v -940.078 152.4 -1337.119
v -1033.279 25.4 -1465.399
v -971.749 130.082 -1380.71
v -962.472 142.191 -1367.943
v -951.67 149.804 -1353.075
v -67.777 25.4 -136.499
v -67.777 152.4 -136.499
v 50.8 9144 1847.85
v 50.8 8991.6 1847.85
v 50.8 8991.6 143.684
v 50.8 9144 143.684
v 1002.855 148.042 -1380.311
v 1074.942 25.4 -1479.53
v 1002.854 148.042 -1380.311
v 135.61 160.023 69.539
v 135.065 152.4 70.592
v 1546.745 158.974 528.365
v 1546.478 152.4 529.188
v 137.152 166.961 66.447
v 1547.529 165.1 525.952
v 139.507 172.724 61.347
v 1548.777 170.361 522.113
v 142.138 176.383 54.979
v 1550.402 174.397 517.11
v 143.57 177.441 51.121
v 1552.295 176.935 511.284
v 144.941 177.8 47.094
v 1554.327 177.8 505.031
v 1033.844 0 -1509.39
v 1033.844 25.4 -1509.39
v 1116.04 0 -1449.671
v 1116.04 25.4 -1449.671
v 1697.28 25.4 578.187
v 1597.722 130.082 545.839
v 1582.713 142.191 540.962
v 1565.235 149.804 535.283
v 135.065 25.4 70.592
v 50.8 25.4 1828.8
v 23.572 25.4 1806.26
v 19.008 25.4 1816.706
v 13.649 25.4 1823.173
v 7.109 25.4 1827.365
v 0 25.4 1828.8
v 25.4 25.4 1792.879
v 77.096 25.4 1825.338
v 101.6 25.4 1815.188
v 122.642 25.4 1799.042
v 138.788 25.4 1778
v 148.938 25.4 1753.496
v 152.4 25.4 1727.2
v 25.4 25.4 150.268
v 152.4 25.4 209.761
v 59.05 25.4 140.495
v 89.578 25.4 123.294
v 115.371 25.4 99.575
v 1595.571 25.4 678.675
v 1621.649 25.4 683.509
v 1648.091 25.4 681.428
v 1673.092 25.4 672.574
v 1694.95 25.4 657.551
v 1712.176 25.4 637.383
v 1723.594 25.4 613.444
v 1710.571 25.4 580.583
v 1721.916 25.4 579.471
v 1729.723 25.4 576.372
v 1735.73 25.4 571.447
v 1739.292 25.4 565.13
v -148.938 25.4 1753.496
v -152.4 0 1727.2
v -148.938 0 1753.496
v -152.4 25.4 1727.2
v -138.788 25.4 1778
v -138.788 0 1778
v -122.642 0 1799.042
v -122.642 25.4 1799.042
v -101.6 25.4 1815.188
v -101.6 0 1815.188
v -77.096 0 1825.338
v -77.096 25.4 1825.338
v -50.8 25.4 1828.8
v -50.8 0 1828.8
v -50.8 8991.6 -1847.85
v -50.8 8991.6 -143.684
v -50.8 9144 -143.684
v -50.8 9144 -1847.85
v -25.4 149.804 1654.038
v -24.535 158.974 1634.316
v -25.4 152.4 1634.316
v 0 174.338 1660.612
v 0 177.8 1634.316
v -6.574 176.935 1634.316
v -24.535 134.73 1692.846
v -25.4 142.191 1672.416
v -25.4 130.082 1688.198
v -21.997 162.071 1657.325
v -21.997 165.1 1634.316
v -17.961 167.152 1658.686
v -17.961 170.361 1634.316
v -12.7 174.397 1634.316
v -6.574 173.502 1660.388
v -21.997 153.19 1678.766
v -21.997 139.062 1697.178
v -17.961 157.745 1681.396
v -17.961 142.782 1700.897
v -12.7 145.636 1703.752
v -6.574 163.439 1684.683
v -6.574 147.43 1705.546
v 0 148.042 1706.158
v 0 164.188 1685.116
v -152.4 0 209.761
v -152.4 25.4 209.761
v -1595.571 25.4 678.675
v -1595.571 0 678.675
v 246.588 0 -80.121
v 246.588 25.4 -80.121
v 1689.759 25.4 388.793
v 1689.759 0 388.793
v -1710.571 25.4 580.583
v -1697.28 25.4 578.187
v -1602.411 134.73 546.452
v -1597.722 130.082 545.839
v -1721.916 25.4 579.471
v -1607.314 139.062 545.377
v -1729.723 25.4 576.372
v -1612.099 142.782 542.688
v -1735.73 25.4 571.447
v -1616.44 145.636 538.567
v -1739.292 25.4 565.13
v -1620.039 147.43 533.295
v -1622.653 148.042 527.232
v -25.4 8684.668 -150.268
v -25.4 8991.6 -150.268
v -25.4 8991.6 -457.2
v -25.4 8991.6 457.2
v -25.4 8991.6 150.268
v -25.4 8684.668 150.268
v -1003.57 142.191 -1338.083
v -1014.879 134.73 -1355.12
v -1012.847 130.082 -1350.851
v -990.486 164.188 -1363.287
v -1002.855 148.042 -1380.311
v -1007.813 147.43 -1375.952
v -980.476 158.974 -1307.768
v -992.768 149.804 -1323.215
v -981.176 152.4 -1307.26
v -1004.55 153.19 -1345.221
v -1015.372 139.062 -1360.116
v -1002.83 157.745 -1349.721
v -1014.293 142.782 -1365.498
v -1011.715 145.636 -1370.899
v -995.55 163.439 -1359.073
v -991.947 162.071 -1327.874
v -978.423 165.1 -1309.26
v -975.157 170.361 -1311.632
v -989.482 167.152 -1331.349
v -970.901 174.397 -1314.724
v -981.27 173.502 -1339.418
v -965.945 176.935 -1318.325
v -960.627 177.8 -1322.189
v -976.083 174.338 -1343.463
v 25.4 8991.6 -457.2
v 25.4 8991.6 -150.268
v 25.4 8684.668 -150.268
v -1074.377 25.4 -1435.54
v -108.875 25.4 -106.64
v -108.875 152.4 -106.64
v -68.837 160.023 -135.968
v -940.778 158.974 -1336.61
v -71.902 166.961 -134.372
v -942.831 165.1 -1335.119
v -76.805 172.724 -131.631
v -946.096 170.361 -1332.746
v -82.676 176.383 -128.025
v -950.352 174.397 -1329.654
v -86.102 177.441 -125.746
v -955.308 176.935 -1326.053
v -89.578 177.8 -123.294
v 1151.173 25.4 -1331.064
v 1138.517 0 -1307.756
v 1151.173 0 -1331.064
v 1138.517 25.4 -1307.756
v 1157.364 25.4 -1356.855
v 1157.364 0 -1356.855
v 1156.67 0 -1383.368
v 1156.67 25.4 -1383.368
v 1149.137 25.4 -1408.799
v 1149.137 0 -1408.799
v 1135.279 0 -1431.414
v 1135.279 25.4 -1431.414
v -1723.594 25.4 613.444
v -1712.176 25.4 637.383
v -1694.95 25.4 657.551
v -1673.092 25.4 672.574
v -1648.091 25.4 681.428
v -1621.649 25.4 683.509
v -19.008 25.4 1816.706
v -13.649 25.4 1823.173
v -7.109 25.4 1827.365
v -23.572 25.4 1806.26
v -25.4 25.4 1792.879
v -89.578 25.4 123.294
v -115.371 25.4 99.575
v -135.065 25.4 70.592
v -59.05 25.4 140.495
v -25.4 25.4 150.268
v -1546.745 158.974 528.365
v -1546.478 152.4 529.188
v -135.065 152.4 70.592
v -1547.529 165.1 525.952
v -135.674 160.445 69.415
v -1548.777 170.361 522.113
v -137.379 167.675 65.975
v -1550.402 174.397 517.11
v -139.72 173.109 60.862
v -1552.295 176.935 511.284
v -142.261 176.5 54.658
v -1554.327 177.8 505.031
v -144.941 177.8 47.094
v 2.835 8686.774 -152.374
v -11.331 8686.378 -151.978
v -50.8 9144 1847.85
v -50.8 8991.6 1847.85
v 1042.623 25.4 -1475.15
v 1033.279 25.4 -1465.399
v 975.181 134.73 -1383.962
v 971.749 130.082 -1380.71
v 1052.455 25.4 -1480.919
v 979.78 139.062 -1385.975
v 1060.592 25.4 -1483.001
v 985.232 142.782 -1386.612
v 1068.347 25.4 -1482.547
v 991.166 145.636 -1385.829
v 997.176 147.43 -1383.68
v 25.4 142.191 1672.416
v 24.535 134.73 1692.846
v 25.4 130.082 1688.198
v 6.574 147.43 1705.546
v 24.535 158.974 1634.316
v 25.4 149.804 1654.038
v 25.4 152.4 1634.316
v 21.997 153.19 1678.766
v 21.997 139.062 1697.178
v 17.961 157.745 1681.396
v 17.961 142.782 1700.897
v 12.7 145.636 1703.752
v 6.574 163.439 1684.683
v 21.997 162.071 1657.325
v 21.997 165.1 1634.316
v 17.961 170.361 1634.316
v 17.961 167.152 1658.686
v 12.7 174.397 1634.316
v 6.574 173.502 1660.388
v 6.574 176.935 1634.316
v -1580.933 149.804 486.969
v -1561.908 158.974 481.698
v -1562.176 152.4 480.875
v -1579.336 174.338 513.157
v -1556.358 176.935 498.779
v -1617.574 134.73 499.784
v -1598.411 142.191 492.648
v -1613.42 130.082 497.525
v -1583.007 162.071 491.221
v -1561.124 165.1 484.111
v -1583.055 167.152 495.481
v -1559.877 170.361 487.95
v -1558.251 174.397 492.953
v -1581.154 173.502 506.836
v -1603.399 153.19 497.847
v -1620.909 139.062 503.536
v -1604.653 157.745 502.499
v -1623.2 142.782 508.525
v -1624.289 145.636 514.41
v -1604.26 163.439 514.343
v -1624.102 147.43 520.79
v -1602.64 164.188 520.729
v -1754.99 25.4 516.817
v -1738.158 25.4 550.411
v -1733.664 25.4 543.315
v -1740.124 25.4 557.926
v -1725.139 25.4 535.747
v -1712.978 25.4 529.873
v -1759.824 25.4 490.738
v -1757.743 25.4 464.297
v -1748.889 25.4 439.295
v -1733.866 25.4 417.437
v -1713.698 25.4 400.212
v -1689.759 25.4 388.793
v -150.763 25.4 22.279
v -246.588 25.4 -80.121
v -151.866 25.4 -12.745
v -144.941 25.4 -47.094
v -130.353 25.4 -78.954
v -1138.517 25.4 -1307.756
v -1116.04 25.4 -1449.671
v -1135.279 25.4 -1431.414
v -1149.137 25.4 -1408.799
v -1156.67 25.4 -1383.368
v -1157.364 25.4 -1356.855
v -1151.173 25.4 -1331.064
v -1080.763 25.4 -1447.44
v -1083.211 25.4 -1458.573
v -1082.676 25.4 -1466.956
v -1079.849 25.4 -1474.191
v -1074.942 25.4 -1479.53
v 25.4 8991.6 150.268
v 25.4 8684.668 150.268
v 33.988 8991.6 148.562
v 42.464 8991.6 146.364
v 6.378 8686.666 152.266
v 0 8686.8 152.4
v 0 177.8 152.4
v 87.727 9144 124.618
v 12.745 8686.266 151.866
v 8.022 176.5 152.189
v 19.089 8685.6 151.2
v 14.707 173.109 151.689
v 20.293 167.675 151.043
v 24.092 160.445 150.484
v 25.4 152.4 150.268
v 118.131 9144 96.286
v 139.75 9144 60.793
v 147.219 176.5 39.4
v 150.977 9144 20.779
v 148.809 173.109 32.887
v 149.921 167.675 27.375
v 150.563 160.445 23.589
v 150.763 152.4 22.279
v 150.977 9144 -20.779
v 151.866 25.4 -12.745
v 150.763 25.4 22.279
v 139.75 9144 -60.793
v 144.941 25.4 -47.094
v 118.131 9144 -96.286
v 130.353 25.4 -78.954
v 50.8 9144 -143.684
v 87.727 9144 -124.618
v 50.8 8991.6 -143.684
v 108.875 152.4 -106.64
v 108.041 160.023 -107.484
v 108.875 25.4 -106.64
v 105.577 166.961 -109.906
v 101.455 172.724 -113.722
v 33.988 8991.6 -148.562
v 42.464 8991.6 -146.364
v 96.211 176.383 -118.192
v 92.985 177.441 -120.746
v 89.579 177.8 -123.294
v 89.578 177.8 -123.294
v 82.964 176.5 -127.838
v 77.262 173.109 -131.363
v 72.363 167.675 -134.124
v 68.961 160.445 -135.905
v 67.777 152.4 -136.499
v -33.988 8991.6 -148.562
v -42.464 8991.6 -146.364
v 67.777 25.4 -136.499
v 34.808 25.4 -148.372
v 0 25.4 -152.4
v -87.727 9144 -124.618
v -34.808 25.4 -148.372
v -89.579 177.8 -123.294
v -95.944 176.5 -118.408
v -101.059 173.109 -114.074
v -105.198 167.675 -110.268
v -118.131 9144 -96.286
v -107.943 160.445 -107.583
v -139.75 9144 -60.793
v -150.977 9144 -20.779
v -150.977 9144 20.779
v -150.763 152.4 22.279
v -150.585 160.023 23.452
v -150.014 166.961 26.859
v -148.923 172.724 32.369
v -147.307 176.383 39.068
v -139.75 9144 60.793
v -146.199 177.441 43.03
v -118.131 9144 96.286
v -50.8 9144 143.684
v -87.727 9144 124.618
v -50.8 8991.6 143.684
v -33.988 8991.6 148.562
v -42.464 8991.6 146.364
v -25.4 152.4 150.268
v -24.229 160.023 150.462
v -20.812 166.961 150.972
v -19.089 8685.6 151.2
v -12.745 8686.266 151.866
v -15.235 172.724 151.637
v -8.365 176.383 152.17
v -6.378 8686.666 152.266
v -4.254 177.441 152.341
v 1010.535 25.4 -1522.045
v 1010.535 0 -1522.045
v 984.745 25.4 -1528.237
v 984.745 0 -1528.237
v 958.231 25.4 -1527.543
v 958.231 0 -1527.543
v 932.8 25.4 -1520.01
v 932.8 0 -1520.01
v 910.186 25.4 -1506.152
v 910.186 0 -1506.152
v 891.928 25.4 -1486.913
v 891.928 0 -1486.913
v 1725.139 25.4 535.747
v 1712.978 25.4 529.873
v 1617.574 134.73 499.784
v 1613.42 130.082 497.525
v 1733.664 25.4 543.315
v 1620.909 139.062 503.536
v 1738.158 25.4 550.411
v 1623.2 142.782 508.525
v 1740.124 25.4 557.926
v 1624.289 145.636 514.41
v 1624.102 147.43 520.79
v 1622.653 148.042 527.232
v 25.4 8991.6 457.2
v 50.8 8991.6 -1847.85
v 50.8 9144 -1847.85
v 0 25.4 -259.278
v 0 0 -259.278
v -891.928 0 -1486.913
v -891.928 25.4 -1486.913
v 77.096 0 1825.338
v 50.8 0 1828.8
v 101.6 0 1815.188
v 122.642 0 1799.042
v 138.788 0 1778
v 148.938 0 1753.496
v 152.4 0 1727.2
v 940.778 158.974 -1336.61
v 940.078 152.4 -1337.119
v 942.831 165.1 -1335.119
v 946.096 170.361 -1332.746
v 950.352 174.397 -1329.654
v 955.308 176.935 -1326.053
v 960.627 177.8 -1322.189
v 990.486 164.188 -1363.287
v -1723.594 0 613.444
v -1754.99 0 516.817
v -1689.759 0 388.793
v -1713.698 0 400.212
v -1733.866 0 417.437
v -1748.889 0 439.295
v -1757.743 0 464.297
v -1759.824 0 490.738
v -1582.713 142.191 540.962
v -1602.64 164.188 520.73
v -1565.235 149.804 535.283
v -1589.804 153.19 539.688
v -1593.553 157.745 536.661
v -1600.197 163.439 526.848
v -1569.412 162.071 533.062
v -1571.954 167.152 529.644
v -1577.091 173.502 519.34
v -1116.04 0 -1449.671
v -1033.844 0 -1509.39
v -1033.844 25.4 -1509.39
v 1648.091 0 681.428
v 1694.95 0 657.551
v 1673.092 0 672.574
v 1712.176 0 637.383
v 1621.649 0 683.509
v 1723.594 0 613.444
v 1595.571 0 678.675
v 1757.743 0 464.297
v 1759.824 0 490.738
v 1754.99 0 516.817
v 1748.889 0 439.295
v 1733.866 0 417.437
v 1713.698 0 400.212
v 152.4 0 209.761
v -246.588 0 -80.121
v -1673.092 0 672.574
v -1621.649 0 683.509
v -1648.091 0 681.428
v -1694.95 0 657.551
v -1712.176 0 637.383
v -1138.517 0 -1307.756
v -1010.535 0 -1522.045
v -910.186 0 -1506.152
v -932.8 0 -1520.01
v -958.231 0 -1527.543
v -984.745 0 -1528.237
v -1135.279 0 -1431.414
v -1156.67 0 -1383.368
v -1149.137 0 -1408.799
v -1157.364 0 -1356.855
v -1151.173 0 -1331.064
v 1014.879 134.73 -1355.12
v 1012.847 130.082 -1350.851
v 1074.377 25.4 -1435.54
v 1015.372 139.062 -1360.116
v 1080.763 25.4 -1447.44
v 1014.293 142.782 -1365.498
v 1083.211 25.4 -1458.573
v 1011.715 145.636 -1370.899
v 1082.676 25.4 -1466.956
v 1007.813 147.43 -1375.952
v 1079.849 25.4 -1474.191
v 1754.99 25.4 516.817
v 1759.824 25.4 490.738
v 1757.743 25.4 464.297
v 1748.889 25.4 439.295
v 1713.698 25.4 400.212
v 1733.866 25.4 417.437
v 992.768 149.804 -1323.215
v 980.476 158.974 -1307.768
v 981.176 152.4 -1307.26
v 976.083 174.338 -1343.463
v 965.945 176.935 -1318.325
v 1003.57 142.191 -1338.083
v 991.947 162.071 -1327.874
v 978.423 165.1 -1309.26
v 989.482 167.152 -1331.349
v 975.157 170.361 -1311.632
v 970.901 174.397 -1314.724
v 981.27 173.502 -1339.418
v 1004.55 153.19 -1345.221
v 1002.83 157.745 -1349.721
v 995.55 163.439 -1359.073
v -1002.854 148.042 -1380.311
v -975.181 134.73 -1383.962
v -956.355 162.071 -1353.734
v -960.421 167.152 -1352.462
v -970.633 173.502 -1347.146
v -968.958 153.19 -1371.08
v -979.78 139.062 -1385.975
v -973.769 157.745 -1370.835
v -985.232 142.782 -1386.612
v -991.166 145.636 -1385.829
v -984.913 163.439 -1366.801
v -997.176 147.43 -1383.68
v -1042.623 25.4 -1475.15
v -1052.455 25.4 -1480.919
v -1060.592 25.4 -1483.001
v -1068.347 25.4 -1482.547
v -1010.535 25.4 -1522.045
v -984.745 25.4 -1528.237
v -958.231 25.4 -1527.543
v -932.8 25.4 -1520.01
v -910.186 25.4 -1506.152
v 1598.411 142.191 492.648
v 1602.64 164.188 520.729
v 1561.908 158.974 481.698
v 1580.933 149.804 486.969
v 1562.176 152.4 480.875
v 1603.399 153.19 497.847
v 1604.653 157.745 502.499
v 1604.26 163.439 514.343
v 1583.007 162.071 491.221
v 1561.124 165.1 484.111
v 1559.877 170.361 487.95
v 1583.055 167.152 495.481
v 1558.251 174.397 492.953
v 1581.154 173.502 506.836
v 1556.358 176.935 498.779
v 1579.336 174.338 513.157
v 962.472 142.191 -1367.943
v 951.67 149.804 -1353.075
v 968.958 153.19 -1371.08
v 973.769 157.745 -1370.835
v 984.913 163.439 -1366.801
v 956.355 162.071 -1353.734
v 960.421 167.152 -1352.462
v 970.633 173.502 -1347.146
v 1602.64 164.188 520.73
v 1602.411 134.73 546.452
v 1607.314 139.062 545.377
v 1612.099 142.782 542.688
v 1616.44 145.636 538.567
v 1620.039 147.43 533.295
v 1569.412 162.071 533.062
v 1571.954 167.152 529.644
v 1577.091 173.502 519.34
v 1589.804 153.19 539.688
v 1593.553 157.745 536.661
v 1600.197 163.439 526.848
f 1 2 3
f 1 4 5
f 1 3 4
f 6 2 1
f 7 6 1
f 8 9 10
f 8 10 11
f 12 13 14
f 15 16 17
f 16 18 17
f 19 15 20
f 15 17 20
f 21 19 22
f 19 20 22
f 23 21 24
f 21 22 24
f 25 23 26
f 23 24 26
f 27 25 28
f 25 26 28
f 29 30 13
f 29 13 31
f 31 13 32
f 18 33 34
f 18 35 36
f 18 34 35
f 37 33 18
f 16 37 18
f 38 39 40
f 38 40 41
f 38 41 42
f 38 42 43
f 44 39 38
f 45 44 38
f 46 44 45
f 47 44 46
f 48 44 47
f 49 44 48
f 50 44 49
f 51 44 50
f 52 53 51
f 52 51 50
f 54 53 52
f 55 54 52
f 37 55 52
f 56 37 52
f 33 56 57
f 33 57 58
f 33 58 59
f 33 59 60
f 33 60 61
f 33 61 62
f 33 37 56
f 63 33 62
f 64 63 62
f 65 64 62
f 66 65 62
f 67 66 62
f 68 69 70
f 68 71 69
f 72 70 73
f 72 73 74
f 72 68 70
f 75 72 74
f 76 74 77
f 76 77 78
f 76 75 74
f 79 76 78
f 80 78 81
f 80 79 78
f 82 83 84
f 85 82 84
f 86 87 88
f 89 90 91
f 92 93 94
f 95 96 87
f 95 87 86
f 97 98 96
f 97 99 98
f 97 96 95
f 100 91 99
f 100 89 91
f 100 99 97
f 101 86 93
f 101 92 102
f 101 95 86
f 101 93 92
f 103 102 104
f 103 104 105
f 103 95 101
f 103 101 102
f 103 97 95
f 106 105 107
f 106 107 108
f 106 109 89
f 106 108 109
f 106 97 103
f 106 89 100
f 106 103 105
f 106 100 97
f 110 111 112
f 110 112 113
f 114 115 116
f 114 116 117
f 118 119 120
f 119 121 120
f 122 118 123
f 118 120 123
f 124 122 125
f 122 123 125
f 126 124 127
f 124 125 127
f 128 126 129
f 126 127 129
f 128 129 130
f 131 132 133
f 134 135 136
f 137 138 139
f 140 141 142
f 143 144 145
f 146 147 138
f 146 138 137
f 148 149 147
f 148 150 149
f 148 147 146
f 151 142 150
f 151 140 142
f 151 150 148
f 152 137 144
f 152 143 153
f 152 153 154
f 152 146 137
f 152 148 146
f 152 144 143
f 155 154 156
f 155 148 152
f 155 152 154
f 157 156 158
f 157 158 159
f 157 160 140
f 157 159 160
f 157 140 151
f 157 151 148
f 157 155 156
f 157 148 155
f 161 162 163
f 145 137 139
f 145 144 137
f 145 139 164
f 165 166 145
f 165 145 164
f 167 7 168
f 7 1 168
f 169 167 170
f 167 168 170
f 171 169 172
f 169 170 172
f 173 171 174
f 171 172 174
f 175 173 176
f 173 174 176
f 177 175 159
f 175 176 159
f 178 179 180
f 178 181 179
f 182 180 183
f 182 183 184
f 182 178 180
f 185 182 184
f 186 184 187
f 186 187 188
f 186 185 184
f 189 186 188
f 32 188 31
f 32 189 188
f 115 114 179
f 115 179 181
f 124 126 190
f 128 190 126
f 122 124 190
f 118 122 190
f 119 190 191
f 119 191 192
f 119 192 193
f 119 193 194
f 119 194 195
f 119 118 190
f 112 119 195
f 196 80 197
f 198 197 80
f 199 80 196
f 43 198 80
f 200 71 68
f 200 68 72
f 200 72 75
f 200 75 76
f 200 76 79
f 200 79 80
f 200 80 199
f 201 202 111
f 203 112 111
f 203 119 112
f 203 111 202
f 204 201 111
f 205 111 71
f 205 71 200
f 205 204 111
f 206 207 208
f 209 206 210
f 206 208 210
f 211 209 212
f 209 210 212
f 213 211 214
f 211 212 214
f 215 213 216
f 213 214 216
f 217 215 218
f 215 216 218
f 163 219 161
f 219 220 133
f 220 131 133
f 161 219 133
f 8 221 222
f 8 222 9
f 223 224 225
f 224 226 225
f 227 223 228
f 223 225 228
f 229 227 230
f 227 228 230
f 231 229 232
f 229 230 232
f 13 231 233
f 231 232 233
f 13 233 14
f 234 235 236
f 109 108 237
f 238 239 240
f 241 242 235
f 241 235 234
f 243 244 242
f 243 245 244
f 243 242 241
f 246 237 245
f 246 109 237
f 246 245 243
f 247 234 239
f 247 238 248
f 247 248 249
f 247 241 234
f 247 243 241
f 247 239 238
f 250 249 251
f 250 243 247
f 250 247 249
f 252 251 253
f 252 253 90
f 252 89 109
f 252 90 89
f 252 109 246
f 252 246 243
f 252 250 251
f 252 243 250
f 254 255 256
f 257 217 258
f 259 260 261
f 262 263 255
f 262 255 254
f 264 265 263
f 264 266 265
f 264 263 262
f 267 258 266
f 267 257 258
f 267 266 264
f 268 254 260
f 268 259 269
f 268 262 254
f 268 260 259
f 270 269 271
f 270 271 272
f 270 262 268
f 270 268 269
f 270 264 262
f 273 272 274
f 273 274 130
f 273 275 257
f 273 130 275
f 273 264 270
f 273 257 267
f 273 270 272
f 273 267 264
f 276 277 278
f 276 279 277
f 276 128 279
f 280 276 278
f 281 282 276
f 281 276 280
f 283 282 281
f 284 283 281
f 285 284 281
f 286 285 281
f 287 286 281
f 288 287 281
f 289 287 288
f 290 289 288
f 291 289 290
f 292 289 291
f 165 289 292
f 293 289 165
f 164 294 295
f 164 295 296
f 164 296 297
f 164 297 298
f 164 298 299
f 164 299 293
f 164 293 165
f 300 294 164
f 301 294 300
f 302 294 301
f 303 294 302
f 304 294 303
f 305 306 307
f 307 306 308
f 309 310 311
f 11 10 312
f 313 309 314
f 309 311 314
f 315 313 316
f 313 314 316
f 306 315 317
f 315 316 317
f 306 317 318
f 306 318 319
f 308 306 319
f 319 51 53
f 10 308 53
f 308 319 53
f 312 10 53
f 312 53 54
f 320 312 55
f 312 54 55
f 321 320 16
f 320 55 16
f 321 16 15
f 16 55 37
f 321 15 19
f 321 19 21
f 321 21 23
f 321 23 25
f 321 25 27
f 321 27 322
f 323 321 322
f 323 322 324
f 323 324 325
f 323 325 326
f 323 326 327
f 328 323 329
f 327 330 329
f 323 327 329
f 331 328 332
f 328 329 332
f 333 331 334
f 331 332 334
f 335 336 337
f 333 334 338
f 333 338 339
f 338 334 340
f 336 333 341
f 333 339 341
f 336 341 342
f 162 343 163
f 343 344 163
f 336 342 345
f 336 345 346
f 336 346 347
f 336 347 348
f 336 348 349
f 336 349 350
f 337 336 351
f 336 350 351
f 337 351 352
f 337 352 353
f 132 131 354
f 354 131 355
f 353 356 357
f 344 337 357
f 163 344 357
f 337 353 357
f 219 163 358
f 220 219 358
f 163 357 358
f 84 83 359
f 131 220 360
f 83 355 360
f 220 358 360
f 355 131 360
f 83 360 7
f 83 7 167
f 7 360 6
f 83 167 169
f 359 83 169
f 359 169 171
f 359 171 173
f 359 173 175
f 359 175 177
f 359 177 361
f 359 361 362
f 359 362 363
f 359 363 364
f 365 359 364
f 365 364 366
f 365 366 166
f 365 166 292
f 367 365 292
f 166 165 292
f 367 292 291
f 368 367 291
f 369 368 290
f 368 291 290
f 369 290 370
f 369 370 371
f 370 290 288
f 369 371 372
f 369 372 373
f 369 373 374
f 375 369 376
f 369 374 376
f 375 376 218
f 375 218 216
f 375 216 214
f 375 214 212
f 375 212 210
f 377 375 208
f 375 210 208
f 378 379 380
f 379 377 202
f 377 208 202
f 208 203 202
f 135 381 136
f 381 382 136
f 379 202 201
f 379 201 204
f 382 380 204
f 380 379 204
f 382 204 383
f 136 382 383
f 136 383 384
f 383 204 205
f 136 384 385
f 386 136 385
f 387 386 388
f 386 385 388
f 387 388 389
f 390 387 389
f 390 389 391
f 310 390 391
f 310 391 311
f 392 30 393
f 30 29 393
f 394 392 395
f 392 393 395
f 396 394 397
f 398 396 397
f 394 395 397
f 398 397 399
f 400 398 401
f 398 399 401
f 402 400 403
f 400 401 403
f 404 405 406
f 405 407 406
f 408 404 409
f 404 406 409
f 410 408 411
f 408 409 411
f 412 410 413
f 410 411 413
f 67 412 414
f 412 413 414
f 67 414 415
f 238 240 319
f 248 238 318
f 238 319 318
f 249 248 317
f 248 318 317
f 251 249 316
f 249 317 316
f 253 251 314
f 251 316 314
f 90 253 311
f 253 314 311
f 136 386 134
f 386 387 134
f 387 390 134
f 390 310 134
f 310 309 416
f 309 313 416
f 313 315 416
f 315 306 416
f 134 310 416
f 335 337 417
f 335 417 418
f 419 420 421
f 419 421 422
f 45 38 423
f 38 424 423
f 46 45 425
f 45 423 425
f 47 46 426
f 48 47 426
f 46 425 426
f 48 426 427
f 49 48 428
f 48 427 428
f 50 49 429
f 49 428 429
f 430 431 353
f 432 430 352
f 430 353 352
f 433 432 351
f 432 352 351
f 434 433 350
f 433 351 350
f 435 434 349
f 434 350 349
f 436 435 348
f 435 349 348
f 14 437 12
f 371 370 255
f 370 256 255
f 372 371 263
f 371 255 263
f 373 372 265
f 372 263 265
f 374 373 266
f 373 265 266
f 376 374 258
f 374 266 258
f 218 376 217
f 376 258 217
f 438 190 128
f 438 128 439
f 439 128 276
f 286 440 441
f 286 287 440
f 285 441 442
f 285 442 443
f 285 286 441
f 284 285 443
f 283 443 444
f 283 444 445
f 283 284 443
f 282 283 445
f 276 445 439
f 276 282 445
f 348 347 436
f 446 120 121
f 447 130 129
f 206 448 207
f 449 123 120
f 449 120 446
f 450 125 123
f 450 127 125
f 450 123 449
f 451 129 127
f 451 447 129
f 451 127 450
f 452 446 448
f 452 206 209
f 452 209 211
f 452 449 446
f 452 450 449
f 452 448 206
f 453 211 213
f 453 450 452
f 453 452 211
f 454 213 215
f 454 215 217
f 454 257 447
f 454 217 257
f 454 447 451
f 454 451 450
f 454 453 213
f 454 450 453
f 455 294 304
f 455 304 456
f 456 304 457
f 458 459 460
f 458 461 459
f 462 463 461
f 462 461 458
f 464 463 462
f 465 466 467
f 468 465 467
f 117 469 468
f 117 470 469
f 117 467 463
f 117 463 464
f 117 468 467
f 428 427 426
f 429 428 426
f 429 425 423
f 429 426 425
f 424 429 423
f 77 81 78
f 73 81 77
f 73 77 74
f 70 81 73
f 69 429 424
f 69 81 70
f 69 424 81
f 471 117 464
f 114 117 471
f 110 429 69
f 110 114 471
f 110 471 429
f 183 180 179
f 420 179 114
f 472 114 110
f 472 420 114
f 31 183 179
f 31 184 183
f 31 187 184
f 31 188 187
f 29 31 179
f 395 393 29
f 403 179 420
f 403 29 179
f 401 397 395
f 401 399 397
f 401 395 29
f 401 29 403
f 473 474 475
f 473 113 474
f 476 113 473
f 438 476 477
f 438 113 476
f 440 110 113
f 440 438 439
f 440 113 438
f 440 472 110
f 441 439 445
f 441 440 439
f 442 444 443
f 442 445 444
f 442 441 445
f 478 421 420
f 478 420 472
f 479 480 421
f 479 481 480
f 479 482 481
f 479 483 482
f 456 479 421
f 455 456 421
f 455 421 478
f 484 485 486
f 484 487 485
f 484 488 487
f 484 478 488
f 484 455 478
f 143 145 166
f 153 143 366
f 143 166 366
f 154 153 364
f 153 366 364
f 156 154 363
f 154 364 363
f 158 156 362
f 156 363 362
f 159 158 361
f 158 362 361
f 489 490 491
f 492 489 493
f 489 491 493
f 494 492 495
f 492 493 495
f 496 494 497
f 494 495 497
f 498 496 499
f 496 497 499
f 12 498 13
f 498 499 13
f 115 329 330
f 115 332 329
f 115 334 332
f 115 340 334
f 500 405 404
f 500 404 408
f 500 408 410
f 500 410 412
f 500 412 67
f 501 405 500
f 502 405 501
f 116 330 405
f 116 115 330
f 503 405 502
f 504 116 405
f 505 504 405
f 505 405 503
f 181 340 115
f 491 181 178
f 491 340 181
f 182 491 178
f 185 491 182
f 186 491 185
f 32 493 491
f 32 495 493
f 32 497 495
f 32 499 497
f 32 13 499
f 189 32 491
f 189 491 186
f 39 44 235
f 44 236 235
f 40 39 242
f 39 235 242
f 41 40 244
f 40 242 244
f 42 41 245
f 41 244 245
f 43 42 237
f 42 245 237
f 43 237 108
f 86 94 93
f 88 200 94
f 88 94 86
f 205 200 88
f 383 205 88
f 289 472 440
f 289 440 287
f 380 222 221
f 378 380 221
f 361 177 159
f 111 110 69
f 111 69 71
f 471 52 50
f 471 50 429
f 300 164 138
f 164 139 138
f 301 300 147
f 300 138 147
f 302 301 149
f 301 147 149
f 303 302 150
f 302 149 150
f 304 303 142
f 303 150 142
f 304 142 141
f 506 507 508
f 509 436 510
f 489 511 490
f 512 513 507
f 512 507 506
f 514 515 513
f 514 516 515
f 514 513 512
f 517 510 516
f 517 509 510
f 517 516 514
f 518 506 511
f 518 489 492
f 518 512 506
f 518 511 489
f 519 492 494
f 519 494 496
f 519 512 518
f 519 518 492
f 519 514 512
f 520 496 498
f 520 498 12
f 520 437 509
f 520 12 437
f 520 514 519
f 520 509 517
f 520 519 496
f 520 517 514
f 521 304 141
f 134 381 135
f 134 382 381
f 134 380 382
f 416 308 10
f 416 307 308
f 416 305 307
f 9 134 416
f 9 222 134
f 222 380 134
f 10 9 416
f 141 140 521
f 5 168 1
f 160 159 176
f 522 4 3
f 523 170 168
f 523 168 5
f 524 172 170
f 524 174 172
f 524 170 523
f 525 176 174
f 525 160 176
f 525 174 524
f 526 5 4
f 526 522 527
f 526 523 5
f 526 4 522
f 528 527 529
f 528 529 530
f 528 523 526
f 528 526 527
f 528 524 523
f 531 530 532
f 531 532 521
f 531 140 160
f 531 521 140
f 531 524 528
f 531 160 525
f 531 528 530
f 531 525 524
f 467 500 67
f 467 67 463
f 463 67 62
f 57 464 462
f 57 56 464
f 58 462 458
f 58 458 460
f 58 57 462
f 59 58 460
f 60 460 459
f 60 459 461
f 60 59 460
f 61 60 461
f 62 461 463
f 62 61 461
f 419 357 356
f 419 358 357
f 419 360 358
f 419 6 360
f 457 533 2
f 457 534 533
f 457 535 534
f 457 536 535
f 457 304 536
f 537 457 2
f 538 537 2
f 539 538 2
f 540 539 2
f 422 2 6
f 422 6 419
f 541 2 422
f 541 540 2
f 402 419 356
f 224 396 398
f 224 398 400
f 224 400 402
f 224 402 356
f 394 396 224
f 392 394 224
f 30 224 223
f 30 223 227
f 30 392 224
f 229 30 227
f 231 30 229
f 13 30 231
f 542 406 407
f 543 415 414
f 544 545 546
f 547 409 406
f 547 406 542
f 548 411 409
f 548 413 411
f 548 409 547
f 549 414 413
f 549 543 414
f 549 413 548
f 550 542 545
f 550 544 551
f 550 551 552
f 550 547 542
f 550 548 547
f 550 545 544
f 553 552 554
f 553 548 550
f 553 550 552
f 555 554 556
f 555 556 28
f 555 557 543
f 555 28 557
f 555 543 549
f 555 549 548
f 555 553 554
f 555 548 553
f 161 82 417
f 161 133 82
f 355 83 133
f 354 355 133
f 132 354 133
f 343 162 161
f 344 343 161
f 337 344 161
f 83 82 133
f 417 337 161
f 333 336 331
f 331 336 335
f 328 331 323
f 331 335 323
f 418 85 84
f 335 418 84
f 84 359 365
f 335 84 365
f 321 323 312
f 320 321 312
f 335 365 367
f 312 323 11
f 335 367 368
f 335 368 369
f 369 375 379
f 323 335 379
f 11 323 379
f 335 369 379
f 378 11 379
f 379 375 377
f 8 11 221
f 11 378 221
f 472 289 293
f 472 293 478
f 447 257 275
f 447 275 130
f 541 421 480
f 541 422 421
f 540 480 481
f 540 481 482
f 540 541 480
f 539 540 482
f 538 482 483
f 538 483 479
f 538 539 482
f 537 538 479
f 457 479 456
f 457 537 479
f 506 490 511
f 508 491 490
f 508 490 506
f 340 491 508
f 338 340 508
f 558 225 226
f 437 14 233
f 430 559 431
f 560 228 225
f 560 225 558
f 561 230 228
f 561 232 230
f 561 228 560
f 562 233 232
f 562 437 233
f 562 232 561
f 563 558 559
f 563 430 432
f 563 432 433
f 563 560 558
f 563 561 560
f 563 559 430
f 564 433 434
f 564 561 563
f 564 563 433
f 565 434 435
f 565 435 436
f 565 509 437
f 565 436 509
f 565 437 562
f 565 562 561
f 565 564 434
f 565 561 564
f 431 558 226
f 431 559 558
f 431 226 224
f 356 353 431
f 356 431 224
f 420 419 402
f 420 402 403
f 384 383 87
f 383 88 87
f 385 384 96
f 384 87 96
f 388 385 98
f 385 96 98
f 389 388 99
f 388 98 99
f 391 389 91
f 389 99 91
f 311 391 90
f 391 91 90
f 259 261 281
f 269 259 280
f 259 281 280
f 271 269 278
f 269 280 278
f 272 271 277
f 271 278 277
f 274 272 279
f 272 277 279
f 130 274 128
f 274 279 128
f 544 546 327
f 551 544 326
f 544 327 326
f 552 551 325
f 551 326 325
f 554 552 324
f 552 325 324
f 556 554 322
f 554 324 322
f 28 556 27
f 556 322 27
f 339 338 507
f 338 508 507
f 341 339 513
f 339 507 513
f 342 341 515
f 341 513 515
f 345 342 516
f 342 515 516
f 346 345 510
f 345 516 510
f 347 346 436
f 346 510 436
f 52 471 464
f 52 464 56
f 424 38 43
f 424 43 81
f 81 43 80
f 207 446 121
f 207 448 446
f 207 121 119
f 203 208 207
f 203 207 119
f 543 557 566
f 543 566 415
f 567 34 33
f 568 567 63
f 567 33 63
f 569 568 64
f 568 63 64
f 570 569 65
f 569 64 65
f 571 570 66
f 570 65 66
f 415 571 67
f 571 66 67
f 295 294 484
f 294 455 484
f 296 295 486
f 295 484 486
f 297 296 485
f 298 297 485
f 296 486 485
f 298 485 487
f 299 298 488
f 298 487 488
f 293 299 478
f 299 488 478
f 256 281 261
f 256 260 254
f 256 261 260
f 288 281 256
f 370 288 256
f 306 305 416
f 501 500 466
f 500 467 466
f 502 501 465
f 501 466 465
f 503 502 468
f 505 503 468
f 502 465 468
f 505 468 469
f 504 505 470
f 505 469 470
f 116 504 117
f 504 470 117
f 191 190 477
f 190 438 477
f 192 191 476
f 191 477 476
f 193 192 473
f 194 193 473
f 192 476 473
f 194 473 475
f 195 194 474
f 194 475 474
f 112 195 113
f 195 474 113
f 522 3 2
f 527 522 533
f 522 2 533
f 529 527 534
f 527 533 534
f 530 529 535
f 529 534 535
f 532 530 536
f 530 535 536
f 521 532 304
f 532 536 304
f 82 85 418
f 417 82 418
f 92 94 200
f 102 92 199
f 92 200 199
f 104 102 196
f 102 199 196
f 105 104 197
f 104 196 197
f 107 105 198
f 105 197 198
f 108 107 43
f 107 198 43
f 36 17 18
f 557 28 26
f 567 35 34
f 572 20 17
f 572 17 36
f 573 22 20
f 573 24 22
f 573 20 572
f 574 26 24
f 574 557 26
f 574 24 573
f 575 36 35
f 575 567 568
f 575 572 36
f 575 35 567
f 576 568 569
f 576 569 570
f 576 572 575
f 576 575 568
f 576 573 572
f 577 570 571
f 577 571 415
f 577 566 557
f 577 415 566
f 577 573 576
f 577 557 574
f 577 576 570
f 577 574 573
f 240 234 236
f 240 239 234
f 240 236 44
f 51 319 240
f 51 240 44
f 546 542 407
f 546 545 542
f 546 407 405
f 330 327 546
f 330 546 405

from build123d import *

# Parameters (mm, degrees)
SKETCH1_R           = 152.4
BOSS_EXTRUDE1_DEPTH = 9144
BOSS_EXTRUDE3_DEPTH = 1828.8
CUT_EXTRUDE1_DEPTH  = 9327.781775082
FILLET10_R          = 101.6
FILLET12_R          = 25.4
CIRPATTERN10_COUNT  = 5
SKETCH4_W           = 101.6
SKETCH4_H           = 152.4
BOSS_EXTRUDE5_DEPTH = 1847.85
BOSS_EXTRUDE6_DEPTH = 25.4
CIRPATTERN11_COUNT  = 2


with BuildPart() as part:
    # Sketch1 → Boss-Extrude1 (new body)
    with BuildSketch(Plane(origin=(0, 0, 0), x_dir=(1, 0, 0), z_dir=(0, 1, 0))):
        with Locations(Location((0, 0, 0), (0, 0, 270))):
            Circle(SKETCH1_R)
    extrude(amount=BOSS_EXTRUDE1_DEPTH)

    # Sketch2 → Boss-Extrude3 (add)
    with BuildSketch(Plane.XY):
        Polygon((-152.4, 0), (-152.4, 25.4), (-25.4, 25.4), (-25.4, 177.8), (25.4, 177.8), (25.4, 25.4), (152.4, 25.4), (152.4, 0), align=None)
    extrude(amount=BOSS_EXTRUDE3_DEPTH)

    # Sketch3 → Cut-Extrude1 (cut, through all)
    with BuildSketch(Plane(origin=(25.4, 0, 0), x_dir=(0, 0, -1), z_dir=(1, 0, 0))):
        Polygon((-1828.8, 25.4), (-1676.4, 177.8), (-1828.8, 177.8), align=None)
    extrude(amount=-CUT_EXTRUDE1_DEPTH, mode=Mode.SUBTRACT)

    # Fillet10
    fillet10_edges = [part.edges().sort_by_distance(p)[0] for p in [
        (152.4, 12.7, 1828.8),
        (-152.4, 12.7, 1828.8),
        (0, 177.8, 1676.4),
    ]]
    fillet(fillet10_edges, radius=FILLET10_R)

    # Fillet12
    fillet12_edges = [part.edges().sort_by_distance(p)[0] for p in [
        (-25.4, 86.721024484, 1767.478975516),
        (-25.4, 170.066160503, 1673.196538791),
        (25.4, 86.721024484, 1767.478975516),
        (25.4, 170.066160503, 1673.196538791),
        (-25.4, 177.8, 892.292164277),
        (25.4, 177.8, 892.292164277),
    ]]
    fillet(fillet12_edges, radius=FILLET12_R - 0.0001)  # a hair under: the kernel refuses the full size


with BuildPart() as cirpattern10_1:
    # CirPattern10: pattern copy
    add(part.part.rotate(Axis((0, 0, 0), (0, 1, 0)), 1 * 360 / CIRPATTERN10_COUNT))


with BuildPart() as cirpattern10_2:
    # CirPattern10: pattern copy
    add(part.part.rotate(Axis((0, 0, 0), (0, 1, 0)), 2 * 360 / CIRPATTERN10_COUNT))


with BuildPart() as cirpattern10_3:
    # CirPattern10: pattern copy
    add(part.part.rotate(Axis((0, 0, 0), (0, 1, 0)), 3 * 360 / CIRPATTERN10_COUNT))


with BuildPart() as cirpattern10_4:
    # CirPattern10: pattern copy
    add(part.part.rotate(Axis((0, 0, 0), (0, 1, 0)), 4 * 360 / CIRPATTERN10_COUNT))


with BuildPart() as part_1:
    add(part.part)

    add(cirpattern10_1.part)  # Boss-Extrude5 merges CirPattern10_1

    add(cirpattern10_2.part)  # Boss-Extrude5 merges CirPattern10_2

    add(cirpattern10_3.part)  # Boss-Extrude5 merges CirPattern10_3

    add(cirpattern10_4.part)  # Boss-Extrude5 merges CirPattern10_4
    # Sketch4 → Boss-Extrude5 (add, symmetric)
    with BuildSketch(Plane.XY):
        with Locations((0, 9067.8)):
            Rectangle(SKETCH4_W, SKETCH4_H)
    extrude(amount=BOSS_EXTRUDE5_DEPTH, both=True)

    # Sketch5 → Boss-Extrude6 (add, symmetric)
    with BuildSketch(Plane(origin=(0, 0, 0), x_dir=(0, 0, -1), z_dir=(1, 0, 0))):
        Polygon((0, 9144), (0, 8534.4), (-609.6, 9144), align=None)
    boss_extrude6 = extrude(amount=BOSS_EXTRUDE6_DEPTH, both=True)

    # CirPattern11: Boss-Extrude6 ×2 about axis
    cirpattern11_axis = Axis((0, 9144, 0), (0, 1, 0))
    for i in range(1, CIRPATTERN11_COUNT):
        add(boss_extrude6.rotate(cirpattern11_axis, i * 360 / CIRPATTERN11_COUNT))


solid = part_1.part
